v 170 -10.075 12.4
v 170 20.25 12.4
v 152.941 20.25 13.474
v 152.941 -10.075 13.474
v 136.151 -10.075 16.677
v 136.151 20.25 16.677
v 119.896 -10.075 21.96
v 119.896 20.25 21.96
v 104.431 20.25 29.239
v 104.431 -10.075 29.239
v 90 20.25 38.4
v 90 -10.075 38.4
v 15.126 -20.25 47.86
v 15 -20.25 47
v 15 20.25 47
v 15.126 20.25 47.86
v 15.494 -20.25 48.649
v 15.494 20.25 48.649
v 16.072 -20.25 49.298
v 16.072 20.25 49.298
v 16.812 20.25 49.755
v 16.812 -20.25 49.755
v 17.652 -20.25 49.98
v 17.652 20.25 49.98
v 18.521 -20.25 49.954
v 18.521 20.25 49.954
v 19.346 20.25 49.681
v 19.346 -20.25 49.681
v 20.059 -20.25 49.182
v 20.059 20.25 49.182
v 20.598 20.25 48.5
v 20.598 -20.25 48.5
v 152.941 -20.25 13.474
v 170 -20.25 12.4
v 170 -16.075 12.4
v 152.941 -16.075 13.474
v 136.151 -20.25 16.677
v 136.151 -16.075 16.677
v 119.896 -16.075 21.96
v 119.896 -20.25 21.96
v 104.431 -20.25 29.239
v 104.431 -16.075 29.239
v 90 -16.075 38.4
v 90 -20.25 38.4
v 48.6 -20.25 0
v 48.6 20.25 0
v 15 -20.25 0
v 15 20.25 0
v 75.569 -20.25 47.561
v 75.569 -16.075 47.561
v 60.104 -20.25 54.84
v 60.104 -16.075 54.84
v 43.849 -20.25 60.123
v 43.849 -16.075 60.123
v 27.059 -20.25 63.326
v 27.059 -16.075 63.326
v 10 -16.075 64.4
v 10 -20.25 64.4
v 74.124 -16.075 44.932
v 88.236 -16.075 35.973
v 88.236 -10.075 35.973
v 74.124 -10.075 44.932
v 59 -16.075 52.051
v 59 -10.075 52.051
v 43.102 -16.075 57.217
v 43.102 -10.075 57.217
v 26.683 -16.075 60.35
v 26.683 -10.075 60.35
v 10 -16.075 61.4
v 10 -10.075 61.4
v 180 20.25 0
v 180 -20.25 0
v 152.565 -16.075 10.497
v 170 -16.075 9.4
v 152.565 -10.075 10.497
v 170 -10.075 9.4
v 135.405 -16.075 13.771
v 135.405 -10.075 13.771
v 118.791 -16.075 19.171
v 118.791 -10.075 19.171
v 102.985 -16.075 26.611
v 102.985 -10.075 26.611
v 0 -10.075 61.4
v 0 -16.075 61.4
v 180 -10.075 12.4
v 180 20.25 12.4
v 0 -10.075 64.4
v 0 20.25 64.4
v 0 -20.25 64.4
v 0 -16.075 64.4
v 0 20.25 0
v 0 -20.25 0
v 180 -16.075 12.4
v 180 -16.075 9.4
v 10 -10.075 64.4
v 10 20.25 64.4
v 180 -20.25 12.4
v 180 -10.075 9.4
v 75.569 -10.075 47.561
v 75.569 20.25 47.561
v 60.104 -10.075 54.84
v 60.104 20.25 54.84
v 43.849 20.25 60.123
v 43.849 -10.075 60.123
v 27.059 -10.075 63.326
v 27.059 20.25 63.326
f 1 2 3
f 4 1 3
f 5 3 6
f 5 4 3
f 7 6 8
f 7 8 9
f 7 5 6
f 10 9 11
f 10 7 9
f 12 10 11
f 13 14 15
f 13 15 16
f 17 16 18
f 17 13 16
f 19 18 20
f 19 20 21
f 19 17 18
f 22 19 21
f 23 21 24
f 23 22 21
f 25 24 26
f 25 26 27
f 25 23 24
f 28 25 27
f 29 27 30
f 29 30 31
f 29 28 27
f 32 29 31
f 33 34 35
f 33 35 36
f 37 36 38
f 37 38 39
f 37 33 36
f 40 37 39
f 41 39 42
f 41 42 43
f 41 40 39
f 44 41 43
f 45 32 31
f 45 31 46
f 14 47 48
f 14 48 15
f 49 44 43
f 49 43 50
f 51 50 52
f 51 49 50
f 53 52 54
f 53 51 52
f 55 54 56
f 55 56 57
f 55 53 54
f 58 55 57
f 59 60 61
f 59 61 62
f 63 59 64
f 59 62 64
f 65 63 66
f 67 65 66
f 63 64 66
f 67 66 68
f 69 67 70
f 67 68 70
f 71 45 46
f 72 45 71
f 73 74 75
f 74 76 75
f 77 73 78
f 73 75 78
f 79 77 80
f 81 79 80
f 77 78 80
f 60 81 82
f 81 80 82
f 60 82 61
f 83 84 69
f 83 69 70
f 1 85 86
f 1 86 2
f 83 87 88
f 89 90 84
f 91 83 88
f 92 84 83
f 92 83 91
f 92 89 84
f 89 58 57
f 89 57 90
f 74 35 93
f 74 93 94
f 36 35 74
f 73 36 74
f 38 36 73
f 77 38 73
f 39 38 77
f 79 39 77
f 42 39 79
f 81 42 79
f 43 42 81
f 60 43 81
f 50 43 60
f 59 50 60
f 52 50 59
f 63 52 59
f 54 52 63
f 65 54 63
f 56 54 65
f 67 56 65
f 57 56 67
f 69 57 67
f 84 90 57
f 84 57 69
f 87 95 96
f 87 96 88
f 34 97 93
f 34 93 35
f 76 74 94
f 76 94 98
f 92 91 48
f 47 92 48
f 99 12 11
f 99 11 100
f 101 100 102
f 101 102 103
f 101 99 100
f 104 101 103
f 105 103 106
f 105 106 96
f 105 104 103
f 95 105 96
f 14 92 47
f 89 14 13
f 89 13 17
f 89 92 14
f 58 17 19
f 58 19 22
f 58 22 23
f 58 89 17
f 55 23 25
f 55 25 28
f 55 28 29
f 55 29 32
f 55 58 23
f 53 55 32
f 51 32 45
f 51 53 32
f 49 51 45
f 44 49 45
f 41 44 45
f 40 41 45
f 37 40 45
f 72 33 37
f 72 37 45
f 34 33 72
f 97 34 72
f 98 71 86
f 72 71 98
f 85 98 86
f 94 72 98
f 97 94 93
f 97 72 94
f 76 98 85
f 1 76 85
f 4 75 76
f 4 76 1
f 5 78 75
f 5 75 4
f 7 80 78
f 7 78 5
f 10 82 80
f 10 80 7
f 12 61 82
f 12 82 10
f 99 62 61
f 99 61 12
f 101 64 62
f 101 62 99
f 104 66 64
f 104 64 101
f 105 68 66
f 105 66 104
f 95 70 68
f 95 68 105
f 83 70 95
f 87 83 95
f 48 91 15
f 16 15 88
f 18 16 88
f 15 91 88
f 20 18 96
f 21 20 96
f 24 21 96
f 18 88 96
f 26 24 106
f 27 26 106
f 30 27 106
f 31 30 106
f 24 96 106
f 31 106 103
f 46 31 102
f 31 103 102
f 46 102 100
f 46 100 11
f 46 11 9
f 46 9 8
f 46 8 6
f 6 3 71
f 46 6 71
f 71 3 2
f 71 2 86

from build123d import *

# Parameters (mm, degrees)
F1_DEPTH = 20.25
F2_W     = 6
F2_H     = 3


with BuildPart() as f1:
    # F0 (on Front) → F1 (new body, symmetric)
    with BuildSketch(Plane.XZ):
        with BuildLine():
            Line((10, 64.4), (0, 64.4))
            Line((0, 64.4), (0, 0))
            Line((0, 0), (15, 0))
            Line((15, 0), (15, 47))
            ThreePointArc((15, 47), (17.223543, 49.897777), (20.598076, 48.5))
            Line((20.598076, 48.5), (48.599564, 0))
            Line((48.599564, 0), (180, 0))
            Line((180, 0), (180, 12.4))
            Line((180, 12.4), (170, 12.4))
            ThreePointArc((170, 12.4), (127.940518, 19.063133), (90, 38.4))
            ThreePointArc((90, 38.4), (52.059482, 57.736867), (10, 64.4))
        make_face()
    extrude(amount=F1_DEPTH, both=True)

    # F3: sweep along a path in F0
    with BuildLine(Plane.XZ) as f3_path:
        Line((180, 12.4), (170, 12.4))
        ThreePointArc((170, 12.4), (127.940518, 19.063133), (90, 38.4))
        ThreePointArc((90, 38.4), (52.059482, 57.736867), (10, 64.4))
        Line((10, 64.4), (0, 64.4))
    # F2 (on face) → F3 (sweep, cut)
    with BuildSketch(Plane.YZ.offset(180)):
        with Locations((-13.075, 10.9)):
            Rectangle(F2_W, F2_H)
    sweep(path=f3_path.line, mode=Mode.SUBTRACT)


solid = f1.part
